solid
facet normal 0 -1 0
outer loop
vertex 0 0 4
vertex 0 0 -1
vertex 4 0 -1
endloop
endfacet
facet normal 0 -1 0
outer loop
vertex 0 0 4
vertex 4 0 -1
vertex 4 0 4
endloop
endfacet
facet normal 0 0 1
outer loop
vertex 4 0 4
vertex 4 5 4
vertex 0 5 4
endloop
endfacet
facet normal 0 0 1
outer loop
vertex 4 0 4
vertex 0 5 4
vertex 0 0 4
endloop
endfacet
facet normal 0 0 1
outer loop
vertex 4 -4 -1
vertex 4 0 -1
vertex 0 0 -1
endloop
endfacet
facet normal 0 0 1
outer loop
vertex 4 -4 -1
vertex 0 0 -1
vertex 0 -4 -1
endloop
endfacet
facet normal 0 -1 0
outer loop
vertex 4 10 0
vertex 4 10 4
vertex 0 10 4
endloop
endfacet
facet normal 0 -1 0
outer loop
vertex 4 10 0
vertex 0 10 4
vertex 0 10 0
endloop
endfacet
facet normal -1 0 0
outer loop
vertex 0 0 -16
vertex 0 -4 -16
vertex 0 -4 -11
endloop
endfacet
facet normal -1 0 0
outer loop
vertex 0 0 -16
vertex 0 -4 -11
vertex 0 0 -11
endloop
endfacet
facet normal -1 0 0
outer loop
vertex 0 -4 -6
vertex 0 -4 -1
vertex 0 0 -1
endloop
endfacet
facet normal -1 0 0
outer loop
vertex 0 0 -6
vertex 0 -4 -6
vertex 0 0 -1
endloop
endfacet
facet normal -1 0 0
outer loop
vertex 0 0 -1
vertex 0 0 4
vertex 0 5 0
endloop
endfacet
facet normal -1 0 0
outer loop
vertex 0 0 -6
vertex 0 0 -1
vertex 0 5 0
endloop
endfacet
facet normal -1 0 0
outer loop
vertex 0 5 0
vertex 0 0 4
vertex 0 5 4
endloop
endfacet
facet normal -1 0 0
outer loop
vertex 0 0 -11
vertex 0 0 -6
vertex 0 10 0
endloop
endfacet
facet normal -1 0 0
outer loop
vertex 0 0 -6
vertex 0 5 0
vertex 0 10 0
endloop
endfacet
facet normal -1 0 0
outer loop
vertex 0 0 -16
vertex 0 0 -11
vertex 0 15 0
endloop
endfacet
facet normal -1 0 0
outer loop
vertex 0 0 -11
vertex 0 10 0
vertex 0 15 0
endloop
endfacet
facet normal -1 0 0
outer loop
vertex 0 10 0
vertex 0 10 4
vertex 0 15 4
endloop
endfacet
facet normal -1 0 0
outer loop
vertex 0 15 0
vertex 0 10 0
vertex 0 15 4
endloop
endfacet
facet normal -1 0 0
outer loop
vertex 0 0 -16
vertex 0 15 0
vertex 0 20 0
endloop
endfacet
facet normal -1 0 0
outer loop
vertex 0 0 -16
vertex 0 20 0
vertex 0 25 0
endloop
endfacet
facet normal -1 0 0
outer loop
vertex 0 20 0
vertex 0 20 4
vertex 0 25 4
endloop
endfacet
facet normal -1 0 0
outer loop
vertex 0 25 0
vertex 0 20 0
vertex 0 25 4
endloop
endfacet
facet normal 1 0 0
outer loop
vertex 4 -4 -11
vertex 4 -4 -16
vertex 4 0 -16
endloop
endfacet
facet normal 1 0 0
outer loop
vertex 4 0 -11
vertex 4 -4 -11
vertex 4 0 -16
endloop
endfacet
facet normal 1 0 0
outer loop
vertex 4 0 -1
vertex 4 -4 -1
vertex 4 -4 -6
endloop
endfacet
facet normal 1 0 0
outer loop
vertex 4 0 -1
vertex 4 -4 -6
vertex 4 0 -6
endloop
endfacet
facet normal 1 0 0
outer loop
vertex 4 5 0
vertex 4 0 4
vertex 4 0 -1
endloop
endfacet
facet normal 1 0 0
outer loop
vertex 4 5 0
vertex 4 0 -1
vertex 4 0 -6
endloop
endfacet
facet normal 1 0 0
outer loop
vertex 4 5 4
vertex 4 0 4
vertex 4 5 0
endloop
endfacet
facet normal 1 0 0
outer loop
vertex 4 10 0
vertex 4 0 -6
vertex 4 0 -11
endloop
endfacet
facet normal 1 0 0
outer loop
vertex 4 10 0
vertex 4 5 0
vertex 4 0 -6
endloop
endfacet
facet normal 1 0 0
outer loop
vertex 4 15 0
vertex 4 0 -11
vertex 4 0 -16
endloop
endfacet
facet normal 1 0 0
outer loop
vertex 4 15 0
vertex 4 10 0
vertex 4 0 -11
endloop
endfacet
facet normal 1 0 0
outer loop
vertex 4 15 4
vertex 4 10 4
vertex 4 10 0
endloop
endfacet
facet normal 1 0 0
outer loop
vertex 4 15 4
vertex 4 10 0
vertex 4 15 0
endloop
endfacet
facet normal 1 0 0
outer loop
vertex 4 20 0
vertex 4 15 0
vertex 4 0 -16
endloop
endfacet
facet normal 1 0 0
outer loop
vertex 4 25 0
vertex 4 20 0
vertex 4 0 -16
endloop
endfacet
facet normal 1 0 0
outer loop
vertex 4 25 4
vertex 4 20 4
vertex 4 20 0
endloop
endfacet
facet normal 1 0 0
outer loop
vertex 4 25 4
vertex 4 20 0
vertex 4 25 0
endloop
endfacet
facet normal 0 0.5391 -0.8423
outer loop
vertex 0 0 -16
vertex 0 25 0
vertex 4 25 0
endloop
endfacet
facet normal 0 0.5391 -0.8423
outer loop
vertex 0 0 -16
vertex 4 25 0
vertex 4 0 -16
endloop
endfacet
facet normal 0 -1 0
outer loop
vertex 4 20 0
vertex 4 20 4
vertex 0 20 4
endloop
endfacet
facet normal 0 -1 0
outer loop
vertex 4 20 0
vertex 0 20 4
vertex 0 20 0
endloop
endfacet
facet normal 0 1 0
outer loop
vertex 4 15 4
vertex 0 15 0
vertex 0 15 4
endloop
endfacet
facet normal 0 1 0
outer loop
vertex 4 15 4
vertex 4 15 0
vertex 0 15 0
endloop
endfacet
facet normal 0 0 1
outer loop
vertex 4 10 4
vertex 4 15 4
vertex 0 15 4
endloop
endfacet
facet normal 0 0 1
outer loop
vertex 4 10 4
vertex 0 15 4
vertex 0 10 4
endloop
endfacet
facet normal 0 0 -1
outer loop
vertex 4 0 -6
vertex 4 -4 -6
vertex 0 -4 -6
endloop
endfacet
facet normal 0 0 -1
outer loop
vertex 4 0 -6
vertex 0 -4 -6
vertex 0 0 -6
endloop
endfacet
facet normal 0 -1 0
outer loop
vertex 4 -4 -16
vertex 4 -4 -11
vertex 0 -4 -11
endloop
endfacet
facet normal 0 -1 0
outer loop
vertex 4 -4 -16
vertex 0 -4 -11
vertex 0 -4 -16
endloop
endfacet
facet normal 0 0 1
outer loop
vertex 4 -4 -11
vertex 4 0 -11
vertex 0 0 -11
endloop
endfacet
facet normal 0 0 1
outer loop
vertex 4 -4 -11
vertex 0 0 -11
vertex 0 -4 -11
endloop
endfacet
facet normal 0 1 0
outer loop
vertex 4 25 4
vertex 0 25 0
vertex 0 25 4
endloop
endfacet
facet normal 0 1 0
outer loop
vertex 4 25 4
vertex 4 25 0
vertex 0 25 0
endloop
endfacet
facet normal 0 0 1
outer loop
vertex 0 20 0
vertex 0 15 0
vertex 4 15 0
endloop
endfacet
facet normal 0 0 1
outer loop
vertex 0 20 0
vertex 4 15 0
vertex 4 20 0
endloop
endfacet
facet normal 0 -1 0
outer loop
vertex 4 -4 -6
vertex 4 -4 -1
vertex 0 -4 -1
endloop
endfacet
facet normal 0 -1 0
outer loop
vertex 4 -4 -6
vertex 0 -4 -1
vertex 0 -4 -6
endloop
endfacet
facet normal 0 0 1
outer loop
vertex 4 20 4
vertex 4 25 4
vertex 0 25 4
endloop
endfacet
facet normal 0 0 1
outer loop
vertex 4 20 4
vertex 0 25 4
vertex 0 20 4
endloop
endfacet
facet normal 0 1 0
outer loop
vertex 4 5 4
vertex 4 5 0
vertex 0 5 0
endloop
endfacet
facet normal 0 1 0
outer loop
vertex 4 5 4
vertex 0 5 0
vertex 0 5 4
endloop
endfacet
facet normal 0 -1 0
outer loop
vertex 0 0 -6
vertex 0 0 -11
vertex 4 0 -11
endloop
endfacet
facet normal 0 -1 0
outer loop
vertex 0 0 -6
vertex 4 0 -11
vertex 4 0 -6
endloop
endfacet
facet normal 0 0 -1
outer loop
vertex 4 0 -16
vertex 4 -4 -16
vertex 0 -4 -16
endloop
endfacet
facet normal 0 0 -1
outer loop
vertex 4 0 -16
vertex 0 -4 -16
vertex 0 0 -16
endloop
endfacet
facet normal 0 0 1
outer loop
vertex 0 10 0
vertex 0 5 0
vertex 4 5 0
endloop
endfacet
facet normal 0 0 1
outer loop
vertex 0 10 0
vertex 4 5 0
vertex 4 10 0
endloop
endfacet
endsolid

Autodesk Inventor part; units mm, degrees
ref_plane "YZ Plane" through (0, 0, 0) normal (1, 0, 0) x (0, 1, 0)
ref_plane "XZ Plane" through (0, 0, 0) normal (0, 1, 0) x (-1, 0, 0)
ref_plane "XY Plane" through (0, 0, 0) normal (0, 0, 1) x (1, 0, 0)
sketch "Schizzo1" plane through (0, 0, 0) normal (1, 0, 0) x (0, 1, 0)
  line L0 (0, 0) -> (25, 0)
  line L1 (25, 0) -> (0, -16)
  line L2 (0, -16) -> (0, 0)
  dimension "d0" = 16
  dimension "d1" = 25
extrude "Estrusione1" add sketch "Schizzo1" along normal blind 4
sketch "Schizzo2" plane through (4, 0, 0) normal (1, 0, 0) x (0, 0, -1)
  line L0 (0, 0) -> (16, 0) projected
  line L1 (16, 0) -> (11, 0)
  line L2 (11, 0) -> (11, -4)
  line L3 (11, -4) -> (16, -4)
  line L4 (16, -4) -> (16, 0)
  line L5 (11, 0) -> (6, 0)
  line L6 (6, 0) -> (1, 0)
  line L7 (1, 0) -> (1, -4)
  line L8 (1, -4) -> (6, -4)
  line L9 (6, -4) -> (6, 0)
  line L10 (0, 25) -> (0, 0) projected
  line L11 (0, 0) -> (0, 5)
  line L12 (0, 5) -> (-4, 5)
  line L13 (-4, 5) -> (-4, 0)
  line L14 (-4, 0) -> (0, 0)
  line L15 (0, 15) -> (-4, 15)
  line L16 (-4, 15) -> (-4, 10)
  line L17 (-4, 10) -> (0, 10)
  line L18 (0, 10) -> (0, 15)
  line L19 (0, 25) -> (-4, 25)
  line L20 (-4, 25) -> (-4, 20)
  line L21 (-4, 20) -> (0, 20)
  line L22 (0, 20) -> (0, 25)
  dimension "d4" = 5
  dimension "d5" = 4
  dimension "d6" = 5
  dimension "d7" = 5
  dimension "d8" = 4
  dimension "d9" = 5
  dimension "d10" = 4
  dimension "d13" = 10
extrude "Estrusione2" add sketch "Schizzo2" against normal blind 4
properties part number "laterali"
